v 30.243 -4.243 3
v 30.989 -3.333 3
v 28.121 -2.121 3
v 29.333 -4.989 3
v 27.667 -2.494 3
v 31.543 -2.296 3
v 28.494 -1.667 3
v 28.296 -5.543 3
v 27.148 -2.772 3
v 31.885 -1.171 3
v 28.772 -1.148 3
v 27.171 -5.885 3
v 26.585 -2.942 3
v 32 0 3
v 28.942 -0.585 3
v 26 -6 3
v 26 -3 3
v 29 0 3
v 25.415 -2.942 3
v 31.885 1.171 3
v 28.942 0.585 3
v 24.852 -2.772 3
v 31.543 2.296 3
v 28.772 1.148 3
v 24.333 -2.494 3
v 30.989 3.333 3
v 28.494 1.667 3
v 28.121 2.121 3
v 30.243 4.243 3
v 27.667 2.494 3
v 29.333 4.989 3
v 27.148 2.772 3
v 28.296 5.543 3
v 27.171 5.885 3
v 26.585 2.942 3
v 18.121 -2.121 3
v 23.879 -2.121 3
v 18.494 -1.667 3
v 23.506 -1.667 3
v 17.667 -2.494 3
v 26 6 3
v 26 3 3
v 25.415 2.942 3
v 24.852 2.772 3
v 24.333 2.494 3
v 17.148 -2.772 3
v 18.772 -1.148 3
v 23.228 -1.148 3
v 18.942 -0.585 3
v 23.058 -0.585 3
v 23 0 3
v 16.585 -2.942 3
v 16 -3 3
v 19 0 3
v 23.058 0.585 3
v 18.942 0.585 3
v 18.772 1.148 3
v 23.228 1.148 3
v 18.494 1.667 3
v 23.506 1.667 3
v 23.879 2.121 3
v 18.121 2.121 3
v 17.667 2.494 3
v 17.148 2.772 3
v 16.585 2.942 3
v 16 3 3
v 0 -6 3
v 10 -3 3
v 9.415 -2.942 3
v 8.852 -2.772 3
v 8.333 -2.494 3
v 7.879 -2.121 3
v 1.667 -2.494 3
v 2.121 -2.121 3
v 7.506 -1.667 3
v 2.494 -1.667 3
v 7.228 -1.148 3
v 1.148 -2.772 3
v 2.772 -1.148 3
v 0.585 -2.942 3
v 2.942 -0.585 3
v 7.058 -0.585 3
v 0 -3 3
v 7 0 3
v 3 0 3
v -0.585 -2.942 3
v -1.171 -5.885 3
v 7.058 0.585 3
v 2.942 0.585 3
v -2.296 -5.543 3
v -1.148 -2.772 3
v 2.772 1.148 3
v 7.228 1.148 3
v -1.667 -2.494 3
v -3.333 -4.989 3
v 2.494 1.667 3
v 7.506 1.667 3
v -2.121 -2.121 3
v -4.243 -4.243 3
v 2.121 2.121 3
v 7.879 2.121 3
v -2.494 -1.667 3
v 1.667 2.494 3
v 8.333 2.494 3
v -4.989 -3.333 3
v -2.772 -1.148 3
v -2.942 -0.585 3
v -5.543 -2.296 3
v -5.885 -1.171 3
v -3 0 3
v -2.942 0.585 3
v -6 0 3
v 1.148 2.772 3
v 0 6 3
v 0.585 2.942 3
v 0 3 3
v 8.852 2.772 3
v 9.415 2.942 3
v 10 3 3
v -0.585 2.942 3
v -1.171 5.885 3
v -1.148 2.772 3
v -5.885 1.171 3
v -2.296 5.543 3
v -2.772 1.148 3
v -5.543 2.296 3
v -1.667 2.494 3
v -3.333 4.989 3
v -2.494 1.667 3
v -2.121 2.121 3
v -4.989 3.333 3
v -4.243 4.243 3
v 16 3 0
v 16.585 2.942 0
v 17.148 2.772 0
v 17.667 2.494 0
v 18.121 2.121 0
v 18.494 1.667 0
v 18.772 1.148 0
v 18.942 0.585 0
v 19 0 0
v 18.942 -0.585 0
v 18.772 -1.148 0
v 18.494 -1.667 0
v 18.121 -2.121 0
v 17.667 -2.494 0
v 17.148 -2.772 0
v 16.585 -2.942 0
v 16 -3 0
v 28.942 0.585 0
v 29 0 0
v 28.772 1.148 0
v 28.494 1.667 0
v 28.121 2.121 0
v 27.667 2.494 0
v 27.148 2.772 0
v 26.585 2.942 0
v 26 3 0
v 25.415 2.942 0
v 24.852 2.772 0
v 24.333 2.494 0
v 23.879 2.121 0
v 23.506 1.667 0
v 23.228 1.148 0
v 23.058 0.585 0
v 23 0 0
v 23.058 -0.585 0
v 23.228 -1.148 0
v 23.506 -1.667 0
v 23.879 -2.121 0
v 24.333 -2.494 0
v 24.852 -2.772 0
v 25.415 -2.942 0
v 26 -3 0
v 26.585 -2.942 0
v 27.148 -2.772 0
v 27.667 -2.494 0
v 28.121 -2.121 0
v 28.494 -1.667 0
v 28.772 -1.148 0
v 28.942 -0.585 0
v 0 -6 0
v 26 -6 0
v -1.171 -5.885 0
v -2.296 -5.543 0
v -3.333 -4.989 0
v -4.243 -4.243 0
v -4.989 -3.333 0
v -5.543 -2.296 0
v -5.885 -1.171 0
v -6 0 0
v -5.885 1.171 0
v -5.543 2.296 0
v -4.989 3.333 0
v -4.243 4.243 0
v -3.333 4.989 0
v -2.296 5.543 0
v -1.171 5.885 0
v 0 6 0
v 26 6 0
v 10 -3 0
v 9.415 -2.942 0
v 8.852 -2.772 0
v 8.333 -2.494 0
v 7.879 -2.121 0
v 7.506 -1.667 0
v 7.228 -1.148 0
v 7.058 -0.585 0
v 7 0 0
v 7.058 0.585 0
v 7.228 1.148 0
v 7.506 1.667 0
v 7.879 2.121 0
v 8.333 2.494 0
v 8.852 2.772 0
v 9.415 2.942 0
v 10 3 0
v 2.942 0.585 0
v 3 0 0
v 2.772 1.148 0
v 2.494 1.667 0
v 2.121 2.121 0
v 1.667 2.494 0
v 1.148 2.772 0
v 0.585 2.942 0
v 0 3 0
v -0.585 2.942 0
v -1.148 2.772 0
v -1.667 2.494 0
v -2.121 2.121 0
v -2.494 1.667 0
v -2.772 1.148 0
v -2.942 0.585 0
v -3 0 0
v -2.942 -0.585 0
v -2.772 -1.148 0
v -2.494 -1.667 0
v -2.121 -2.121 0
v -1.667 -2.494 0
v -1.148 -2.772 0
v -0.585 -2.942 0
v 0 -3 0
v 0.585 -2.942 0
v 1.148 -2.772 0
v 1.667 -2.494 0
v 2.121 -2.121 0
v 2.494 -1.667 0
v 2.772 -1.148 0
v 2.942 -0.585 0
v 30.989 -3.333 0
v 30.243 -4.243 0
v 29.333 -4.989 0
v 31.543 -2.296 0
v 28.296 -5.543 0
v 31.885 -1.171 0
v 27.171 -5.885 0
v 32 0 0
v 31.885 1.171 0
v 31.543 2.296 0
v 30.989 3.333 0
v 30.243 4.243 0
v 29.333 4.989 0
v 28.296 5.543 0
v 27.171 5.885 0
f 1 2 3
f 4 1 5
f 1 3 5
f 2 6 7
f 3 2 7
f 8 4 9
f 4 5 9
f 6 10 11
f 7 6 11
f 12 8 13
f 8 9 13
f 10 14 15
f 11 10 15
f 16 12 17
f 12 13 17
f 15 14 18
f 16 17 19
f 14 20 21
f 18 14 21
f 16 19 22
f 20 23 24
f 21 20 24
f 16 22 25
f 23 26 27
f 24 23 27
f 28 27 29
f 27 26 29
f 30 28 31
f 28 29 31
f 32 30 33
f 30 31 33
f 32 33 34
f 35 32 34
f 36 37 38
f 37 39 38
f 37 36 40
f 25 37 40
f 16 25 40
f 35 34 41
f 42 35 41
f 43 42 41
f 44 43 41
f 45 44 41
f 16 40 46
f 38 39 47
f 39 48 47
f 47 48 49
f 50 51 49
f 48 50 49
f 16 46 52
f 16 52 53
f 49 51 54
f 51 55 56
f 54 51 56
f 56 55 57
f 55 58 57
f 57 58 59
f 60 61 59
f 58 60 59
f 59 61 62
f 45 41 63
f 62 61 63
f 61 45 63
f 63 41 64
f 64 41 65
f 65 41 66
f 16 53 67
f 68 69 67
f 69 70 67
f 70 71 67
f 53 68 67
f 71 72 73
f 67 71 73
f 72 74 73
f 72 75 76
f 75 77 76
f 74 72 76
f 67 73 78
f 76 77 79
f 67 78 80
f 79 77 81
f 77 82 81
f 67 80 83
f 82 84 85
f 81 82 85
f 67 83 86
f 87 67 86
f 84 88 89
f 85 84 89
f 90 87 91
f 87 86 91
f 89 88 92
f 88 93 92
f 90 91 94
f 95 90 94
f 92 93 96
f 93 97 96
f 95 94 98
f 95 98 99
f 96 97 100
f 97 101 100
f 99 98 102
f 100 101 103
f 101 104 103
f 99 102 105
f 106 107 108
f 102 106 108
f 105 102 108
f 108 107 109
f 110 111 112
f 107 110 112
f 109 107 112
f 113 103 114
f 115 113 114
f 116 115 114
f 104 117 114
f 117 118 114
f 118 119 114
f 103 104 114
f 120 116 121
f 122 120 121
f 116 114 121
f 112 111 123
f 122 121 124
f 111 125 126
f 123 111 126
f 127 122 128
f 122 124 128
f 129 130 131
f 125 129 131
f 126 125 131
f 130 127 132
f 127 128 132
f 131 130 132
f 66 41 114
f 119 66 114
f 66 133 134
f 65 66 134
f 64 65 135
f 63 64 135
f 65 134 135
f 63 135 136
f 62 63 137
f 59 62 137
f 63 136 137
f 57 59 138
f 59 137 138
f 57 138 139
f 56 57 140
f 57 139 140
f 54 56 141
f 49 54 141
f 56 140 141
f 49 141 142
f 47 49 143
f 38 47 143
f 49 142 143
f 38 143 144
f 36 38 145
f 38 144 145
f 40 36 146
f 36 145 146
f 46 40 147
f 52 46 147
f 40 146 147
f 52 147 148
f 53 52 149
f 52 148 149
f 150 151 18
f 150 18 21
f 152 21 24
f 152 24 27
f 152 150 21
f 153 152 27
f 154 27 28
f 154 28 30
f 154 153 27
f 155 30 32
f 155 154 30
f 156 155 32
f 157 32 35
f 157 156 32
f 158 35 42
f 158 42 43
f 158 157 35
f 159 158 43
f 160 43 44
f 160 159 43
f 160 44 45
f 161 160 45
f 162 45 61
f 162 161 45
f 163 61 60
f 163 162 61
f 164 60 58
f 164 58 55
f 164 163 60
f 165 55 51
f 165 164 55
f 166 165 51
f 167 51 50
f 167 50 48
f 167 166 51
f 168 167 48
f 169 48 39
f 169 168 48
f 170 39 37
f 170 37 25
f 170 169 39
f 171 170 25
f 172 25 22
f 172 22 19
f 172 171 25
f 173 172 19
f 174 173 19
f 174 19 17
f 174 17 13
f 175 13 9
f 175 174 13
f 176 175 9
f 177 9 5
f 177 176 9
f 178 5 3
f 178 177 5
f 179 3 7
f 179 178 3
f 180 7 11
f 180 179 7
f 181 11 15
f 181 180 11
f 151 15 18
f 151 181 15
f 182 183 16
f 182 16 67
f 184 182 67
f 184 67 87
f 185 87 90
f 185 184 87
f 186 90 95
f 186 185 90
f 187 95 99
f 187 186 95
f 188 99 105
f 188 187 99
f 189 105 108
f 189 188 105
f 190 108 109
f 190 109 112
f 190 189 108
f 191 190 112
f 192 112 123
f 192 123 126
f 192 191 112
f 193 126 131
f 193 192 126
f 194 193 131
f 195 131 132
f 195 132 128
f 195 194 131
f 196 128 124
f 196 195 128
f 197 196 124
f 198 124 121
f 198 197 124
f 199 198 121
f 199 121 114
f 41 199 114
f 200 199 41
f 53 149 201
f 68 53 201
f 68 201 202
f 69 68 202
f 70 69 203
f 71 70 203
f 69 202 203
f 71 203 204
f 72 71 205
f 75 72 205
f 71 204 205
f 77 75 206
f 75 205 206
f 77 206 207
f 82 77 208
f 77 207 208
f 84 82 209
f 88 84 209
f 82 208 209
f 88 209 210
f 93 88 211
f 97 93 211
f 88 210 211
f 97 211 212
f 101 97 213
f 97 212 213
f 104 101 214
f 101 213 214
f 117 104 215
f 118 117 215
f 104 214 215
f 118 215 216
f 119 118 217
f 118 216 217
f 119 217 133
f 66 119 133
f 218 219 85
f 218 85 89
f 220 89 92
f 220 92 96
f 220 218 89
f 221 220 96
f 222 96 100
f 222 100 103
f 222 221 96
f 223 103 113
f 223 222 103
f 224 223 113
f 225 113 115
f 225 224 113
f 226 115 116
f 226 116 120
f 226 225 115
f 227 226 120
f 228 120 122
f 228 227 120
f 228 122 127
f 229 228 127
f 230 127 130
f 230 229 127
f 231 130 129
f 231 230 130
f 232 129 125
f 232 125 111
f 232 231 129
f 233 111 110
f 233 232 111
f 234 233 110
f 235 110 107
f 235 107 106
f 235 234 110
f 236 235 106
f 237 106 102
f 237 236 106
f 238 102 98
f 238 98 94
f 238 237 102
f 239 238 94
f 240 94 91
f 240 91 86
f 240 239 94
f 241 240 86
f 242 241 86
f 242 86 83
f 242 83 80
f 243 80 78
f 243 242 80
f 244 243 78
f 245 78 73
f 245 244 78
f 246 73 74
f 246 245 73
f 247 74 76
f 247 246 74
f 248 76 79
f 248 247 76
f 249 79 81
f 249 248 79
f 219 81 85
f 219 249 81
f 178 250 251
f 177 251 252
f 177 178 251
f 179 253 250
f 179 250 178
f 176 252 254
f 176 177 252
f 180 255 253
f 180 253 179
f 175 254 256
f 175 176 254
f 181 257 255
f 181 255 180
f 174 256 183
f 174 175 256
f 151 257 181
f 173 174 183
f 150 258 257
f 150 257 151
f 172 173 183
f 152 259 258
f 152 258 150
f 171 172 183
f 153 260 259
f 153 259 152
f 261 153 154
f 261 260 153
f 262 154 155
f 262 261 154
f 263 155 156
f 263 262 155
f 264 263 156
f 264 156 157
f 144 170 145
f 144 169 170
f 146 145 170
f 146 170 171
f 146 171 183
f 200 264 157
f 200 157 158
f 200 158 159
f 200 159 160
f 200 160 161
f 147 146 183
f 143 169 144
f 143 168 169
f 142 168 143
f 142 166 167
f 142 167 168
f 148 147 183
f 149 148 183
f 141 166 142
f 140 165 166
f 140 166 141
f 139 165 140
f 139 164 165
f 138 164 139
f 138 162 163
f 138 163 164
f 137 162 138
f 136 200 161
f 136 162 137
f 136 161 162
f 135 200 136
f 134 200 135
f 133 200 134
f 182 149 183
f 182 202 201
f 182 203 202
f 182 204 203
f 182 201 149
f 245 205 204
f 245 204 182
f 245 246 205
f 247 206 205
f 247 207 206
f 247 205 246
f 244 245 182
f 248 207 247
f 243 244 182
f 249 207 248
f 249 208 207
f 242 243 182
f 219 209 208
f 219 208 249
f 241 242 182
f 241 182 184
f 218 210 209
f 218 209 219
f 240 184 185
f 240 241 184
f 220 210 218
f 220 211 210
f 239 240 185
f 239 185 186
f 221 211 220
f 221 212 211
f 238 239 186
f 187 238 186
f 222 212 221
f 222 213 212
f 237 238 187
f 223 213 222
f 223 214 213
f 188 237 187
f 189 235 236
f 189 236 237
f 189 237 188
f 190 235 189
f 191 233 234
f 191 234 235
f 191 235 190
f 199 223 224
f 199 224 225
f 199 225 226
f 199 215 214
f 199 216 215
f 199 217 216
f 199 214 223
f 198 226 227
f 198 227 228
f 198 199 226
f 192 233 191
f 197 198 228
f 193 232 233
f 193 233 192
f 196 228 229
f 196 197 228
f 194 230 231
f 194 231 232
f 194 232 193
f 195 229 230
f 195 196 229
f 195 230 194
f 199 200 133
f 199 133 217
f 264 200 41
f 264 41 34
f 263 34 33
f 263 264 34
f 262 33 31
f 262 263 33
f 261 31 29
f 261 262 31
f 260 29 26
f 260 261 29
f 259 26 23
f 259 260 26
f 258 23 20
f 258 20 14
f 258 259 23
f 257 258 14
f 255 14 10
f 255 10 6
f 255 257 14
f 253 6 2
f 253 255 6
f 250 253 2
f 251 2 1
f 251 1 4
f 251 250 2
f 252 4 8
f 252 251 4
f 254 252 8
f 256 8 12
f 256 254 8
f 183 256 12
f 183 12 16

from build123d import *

# Parameters (mm, degrees)
SKETCH_2_R      = 3
EXTRUDE_1_DEPTH = 3


with BuildPart() as part:
    # 草图2 → 凸台-拉伸1 (new body)
    with BuildSketch(Plane.XY):
        with BuildLine():
            Line((0, 6), (26, 6))
            ThreePointArc((26, 6), (32, 0), (26, -6))
            Line((26, -6), (0, -6))
            ThreePointArc((0, -6), (-6, 0), (0, 6))
        make_face()
        Circle(SKETCH_2_R, mode=Mode.SUBTRACT)
        with Locations((26, 0)):
            Circle(SKETCH_2_R, mode=Mode.SUBTRACT)
        with BuildLine():
            Line((10, 3), (16, 3))
            ThreePointArc((16, 3), (19, 0), (16, -3))
            Line((16, -3), (10, -3))
            ThreePointArc((10, -3), (7, 0), (10, 3))
        make_face(mode=Mode.SUBTRACT)
    extrude(amount=EXTRUDE_1_DEPTH)


solid = part.part
